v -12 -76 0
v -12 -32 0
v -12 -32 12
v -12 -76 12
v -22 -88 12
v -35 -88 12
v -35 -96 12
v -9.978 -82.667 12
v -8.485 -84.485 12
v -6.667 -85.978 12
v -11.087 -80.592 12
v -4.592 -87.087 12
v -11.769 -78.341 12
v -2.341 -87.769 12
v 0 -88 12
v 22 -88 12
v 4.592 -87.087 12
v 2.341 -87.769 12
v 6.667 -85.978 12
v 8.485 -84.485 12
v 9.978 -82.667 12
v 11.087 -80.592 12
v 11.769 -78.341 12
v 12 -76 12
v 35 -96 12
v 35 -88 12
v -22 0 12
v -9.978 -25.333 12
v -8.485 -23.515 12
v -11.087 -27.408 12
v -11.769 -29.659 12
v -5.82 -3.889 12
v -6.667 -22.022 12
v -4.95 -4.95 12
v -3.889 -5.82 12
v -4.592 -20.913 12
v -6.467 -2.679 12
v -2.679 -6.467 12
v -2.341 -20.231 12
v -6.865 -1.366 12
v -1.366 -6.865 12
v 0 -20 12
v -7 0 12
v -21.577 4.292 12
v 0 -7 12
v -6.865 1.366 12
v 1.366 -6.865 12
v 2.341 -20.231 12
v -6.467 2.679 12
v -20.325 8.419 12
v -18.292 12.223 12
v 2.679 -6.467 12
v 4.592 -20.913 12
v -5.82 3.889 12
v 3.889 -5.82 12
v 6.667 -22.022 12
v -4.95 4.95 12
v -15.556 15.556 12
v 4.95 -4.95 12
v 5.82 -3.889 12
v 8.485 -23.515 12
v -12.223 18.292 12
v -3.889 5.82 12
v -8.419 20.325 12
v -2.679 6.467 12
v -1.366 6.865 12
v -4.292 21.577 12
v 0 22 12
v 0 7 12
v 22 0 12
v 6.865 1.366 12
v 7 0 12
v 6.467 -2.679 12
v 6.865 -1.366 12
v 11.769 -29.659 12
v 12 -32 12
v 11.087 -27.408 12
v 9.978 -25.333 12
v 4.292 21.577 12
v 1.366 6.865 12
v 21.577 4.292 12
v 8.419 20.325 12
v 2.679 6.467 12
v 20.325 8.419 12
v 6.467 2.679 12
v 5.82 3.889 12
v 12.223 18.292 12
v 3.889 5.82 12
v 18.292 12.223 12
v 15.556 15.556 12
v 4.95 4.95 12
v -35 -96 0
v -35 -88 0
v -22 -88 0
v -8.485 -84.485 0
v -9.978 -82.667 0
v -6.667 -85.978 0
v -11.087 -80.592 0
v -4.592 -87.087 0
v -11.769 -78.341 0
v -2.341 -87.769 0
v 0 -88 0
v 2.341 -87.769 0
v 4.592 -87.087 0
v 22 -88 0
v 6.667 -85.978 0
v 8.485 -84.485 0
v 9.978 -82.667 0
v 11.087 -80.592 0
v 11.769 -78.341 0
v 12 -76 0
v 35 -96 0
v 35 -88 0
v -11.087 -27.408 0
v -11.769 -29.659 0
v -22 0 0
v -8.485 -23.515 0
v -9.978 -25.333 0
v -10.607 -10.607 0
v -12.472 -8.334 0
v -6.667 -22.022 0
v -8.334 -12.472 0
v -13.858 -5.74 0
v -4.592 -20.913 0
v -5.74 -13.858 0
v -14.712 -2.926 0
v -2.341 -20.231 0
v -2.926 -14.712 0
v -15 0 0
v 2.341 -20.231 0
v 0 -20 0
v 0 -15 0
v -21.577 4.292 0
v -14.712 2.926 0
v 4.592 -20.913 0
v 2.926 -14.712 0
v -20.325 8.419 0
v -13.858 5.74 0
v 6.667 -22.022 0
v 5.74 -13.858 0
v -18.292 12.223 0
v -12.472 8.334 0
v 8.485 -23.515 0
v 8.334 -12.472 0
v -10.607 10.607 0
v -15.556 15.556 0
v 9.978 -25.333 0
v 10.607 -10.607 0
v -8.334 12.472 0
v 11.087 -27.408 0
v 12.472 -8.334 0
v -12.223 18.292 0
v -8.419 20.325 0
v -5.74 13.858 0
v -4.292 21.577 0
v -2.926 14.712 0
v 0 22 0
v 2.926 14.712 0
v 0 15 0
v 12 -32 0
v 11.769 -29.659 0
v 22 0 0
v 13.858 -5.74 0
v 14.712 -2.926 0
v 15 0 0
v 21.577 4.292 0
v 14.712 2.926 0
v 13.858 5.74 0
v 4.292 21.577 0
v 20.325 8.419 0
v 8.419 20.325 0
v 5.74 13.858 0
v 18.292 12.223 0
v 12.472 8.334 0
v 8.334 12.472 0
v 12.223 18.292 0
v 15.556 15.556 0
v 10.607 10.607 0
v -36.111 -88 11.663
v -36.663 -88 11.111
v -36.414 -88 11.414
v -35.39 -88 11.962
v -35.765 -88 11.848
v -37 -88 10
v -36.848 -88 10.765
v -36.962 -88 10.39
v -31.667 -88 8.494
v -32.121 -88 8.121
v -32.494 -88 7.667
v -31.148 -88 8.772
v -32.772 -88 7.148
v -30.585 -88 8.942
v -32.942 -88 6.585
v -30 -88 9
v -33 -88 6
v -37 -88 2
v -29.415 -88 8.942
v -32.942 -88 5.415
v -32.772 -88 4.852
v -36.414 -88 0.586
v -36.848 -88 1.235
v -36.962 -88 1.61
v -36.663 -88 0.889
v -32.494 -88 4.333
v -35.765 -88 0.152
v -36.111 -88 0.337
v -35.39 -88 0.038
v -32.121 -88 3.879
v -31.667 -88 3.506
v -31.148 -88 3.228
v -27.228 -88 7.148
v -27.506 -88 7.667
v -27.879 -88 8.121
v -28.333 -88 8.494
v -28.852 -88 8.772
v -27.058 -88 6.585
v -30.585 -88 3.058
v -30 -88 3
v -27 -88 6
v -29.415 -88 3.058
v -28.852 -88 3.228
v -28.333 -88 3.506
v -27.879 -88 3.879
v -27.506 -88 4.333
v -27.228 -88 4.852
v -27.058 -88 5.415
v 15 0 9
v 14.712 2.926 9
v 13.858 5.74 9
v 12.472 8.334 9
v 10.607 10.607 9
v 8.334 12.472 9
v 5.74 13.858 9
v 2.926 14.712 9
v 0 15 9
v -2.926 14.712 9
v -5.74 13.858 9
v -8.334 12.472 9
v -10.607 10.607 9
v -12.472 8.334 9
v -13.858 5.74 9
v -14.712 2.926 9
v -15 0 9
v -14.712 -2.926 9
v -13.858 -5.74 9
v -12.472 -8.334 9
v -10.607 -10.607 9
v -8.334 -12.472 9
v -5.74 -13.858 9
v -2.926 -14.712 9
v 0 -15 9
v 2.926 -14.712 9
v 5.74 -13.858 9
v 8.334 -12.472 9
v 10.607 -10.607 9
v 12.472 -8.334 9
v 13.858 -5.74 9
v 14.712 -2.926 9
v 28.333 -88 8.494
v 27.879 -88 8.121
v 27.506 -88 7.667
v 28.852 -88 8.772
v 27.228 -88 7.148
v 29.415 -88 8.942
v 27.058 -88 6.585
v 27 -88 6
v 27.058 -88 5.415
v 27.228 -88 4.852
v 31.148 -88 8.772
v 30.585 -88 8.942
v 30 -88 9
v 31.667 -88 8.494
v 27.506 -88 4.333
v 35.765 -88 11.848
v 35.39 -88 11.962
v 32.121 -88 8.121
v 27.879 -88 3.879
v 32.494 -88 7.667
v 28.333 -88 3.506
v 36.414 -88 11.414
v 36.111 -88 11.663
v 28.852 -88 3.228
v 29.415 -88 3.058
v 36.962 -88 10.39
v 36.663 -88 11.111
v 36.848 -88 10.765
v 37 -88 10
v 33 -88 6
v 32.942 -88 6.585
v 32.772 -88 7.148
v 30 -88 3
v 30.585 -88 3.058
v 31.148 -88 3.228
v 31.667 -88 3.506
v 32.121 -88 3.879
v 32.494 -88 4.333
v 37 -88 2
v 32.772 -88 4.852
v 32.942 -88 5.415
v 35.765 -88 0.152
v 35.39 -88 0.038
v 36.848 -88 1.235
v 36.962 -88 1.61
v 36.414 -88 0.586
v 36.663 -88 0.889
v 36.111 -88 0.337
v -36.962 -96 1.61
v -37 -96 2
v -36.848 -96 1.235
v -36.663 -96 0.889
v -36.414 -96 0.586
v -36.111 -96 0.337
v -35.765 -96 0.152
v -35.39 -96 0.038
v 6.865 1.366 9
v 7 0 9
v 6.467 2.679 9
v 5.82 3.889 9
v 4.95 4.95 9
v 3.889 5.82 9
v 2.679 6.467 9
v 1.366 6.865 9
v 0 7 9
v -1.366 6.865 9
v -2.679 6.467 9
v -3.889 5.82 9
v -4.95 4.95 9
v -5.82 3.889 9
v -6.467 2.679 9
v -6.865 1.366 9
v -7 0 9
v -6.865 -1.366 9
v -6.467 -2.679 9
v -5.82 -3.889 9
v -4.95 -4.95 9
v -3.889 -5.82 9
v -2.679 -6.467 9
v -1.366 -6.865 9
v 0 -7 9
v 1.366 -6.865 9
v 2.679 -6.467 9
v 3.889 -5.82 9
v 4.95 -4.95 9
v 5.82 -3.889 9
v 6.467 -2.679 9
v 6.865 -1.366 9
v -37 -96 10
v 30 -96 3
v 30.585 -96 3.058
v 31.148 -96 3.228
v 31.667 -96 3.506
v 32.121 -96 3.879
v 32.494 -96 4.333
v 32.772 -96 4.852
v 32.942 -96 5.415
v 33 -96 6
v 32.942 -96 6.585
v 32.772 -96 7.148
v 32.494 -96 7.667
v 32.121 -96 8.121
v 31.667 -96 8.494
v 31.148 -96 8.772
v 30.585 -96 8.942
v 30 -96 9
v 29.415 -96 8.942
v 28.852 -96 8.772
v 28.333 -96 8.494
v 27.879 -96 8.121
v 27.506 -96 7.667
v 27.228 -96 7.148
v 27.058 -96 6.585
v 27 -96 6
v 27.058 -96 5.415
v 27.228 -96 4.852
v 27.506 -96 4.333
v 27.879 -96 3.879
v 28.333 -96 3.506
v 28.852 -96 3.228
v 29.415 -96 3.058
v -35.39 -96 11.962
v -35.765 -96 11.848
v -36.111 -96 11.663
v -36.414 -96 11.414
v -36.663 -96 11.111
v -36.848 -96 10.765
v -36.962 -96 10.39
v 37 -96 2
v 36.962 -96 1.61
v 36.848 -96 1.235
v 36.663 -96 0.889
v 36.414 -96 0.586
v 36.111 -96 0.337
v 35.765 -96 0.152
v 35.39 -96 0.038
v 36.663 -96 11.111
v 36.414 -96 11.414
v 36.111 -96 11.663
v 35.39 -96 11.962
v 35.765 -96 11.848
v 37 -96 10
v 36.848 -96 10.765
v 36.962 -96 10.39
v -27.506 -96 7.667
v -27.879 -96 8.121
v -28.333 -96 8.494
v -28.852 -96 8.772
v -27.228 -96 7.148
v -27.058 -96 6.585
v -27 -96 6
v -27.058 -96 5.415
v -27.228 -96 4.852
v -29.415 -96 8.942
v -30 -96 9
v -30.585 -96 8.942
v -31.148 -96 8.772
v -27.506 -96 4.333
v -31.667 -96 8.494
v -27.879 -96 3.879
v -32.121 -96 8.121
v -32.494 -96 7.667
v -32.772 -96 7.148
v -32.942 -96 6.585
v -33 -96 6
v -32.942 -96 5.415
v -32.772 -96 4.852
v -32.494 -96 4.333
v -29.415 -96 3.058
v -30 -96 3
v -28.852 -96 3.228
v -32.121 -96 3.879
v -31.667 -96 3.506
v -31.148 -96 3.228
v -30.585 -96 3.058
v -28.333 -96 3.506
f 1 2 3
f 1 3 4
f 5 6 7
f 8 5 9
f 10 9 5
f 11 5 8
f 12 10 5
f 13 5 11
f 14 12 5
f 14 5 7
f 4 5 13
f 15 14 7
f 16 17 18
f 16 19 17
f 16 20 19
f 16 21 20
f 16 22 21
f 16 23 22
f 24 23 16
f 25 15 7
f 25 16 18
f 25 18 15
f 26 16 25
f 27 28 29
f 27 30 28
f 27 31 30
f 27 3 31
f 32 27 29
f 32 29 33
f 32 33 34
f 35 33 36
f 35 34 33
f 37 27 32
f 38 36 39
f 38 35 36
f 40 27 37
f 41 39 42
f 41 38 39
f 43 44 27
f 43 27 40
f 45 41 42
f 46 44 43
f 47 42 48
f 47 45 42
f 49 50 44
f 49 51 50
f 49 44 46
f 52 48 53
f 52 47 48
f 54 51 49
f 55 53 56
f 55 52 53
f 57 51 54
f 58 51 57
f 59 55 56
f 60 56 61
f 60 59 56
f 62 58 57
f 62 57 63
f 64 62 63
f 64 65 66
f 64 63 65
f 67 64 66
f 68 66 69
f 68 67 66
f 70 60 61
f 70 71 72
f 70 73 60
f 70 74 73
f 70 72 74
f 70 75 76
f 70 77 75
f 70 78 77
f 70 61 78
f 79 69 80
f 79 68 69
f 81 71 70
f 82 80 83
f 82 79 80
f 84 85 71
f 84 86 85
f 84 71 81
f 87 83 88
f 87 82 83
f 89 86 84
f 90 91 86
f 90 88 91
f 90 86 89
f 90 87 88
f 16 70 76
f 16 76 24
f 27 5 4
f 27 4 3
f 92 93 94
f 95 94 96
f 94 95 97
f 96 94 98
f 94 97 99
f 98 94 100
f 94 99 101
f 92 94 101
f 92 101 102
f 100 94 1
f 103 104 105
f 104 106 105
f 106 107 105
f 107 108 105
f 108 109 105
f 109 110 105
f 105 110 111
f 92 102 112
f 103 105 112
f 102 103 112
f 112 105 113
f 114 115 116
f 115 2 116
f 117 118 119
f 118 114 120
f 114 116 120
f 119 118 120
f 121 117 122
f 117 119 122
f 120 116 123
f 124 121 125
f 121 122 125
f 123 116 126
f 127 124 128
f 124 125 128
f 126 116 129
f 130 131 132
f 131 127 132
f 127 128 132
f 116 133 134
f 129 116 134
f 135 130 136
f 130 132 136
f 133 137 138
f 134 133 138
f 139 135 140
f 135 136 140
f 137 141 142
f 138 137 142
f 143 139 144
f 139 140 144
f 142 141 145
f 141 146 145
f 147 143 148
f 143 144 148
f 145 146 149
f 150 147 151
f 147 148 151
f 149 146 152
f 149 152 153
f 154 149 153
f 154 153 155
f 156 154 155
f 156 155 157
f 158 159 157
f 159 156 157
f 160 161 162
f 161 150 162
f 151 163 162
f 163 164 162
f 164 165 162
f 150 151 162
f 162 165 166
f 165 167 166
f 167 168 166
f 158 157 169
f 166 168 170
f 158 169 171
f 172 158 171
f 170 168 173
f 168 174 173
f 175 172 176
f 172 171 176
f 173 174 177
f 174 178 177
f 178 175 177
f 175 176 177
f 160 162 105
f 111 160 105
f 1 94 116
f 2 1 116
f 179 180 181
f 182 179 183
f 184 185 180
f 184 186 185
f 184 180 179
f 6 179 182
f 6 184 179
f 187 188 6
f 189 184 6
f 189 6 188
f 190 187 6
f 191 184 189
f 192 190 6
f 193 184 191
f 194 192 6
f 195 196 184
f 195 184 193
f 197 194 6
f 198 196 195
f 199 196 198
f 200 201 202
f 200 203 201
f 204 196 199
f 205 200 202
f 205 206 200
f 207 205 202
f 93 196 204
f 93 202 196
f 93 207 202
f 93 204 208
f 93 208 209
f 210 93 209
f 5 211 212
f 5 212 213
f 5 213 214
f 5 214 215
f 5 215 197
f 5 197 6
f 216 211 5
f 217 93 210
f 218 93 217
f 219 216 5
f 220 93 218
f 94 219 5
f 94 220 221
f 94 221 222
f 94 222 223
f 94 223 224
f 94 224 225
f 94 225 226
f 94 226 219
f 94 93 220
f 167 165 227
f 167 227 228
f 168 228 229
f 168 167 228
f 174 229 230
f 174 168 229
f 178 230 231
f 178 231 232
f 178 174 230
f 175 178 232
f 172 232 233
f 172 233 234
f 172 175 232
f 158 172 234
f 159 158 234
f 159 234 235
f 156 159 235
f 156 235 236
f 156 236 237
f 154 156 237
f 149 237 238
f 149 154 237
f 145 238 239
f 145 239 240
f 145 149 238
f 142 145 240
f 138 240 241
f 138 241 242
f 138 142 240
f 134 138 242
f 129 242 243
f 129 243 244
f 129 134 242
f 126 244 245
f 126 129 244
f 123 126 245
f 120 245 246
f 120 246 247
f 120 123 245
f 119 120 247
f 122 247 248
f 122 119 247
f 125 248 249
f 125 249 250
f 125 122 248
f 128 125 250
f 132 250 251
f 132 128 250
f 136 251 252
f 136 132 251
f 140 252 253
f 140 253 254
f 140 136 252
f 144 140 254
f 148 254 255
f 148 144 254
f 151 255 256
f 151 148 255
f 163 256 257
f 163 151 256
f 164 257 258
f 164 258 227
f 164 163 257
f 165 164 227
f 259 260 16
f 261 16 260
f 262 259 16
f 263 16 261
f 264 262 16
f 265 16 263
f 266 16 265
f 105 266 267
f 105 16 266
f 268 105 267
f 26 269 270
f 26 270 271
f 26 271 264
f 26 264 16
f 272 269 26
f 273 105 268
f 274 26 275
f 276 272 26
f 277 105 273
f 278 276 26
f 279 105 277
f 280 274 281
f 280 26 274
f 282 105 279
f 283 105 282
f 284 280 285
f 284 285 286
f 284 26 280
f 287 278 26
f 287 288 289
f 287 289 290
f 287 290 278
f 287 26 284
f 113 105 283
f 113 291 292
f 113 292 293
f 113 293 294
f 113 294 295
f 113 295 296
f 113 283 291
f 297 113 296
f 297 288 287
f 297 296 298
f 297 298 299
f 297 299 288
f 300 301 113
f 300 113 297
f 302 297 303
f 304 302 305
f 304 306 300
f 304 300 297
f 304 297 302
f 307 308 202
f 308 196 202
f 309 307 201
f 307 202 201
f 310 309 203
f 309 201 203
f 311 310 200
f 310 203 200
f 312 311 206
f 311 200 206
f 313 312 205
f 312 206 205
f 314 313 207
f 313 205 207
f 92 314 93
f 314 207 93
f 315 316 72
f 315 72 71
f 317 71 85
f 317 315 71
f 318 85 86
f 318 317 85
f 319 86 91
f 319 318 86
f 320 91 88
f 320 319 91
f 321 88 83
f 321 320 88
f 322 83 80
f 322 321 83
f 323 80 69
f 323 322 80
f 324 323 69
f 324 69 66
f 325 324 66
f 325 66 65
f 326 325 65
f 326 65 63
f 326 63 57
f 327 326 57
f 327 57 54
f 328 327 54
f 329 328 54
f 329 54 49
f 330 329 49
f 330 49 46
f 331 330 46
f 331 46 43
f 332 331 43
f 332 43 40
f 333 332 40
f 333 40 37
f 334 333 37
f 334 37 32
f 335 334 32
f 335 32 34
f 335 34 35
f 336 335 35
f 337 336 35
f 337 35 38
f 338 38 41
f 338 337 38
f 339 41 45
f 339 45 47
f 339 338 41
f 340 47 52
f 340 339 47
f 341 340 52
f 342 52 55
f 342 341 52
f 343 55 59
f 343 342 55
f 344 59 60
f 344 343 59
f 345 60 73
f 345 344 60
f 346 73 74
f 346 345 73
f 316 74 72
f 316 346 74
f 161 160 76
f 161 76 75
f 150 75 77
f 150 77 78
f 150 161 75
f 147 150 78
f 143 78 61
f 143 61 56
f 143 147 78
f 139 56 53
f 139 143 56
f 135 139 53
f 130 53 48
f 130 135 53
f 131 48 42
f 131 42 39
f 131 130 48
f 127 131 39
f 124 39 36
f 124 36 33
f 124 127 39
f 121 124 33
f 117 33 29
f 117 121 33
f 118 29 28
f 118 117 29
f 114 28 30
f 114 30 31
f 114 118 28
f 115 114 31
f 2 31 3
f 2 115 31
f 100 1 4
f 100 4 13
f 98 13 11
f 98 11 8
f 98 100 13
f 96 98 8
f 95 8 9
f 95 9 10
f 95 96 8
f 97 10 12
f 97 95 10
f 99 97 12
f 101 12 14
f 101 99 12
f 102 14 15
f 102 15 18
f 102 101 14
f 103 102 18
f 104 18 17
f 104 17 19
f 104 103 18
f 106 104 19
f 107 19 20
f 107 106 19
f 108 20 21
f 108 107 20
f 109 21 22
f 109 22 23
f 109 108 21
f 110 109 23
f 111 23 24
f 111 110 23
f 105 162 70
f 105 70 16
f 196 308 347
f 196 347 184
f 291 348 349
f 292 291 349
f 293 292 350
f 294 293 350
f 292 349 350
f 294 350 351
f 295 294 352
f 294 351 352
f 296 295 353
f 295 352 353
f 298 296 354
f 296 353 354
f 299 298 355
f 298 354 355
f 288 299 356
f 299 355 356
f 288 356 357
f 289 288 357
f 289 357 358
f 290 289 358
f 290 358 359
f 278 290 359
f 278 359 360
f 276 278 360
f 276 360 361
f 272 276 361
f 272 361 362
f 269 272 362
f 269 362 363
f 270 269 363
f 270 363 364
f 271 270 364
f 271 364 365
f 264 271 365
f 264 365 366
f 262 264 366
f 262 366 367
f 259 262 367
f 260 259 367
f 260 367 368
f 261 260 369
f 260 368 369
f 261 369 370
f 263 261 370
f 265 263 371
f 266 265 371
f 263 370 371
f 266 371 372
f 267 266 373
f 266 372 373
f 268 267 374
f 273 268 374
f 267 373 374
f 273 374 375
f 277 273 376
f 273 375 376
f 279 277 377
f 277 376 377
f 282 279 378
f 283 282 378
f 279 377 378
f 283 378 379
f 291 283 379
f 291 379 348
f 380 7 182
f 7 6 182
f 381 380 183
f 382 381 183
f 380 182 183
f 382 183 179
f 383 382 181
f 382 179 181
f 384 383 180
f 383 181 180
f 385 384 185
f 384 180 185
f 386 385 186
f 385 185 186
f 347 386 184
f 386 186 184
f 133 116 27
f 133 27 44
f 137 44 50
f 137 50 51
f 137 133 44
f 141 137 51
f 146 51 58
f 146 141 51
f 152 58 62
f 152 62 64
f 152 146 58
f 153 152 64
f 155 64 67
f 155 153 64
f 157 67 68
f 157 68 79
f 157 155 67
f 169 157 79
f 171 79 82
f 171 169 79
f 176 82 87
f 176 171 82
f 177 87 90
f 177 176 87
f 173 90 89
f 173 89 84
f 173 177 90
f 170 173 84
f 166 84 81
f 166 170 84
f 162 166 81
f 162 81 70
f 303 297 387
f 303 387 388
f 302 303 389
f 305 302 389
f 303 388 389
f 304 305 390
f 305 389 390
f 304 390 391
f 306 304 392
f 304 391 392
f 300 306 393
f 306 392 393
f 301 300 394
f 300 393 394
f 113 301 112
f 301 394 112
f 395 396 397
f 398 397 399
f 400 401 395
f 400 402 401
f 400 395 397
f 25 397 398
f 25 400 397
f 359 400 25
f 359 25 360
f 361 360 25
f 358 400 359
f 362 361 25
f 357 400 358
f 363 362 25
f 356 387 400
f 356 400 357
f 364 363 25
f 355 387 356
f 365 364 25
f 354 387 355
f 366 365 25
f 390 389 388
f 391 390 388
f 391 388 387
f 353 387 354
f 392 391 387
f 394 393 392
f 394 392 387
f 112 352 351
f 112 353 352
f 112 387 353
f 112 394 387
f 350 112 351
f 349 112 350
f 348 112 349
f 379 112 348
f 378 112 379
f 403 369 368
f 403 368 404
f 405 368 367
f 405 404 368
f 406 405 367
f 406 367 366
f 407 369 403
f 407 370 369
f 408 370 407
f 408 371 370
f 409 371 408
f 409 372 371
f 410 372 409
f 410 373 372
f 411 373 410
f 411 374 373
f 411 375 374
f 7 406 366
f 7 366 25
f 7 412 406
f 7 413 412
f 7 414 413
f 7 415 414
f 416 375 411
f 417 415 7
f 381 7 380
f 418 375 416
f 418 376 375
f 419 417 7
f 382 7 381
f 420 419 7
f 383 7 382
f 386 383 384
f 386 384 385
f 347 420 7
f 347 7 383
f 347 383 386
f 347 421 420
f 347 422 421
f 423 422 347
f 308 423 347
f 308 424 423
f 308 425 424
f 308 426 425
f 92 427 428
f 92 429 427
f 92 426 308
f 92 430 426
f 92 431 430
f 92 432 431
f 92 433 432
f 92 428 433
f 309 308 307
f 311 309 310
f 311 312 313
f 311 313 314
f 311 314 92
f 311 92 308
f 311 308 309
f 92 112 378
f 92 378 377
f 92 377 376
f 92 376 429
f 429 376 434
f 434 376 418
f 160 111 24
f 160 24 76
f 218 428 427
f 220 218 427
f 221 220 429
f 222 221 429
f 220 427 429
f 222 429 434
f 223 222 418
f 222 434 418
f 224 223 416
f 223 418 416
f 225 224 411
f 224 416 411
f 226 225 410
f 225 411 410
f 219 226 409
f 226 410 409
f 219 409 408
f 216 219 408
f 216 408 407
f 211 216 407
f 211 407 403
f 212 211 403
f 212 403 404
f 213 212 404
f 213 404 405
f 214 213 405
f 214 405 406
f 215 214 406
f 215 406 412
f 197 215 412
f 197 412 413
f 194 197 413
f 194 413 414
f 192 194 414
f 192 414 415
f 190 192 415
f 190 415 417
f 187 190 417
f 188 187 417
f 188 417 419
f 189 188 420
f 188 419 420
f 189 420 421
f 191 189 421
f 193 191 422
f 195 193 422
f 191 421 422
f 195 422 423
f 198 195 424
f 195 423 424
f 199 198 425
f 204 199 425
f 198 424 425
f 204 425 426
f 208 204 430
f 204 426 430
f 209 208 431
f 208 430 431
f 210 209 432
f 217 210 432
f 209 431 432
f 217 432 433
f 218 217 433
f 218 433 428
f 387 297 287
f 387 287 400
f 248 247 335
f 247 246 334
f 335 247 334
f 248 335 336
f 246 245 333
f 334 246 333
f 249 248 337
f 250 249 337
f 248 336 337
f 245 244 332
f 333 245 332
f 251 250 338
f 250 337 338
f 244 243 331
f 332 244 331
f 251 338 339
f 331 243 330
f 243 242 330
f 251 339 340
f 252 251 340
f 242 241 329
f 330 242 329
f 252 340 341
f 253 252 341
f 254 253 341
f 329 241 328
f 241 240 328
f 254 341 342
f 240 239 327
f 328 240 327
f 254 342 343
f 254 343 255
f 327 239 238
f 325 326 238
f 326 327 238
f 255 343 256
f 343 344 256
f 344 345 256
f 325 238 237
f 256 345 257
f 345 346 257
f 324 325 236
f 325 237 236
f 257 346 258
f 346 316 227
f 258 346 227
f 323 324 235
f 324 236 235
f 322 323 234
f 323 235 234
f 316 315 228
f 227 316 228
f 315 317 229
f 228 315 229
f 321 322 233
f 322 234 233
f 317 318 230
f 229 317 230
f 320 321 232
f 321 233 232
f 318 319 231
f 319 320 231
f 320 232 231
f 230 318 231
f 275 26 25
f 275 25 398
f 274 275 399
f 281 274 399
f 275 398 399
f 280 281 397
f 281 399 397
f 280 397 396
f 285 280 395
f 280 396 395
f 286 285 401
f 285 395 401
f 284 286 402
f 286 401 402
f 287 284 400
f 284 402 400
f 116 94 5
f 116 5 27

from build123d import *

# Parameters (mm, degrees)
SKETCH1_R           = 7
BOSS_EXTRUDE2_DEPTH = 12
SKETCH3_R           = 3
CUT_EXTRUDE1_DEPTH  = 125.245724273
SKETCH1_4_R         = 15
SKETCH1_4_R_2       = 7
CUT_EXTRUDE2_DEPTH  = 9
FILLET1_R           = 2


with BuildPart() as part:
    # Sketch1 → Boss-Extrude2 (new body)
    with BuildSketch(Plane.XY):
        with BuildLine():
            Line((22, -88), (22, 0))
            ThreePointArc((22, 0), (0, 22), (-22, 0))
            Line((-22, 0), (-22, -88))
            Line((-22, -88), (-37, -88))
            Line((-37, -88), (-37, -96))
            Line((-37, -96), (37, -96))
            Line((37, -96), (37, -88))
            Line((37, -88), (22, -88))
        make_face()
        with BuildLine():
            ThreePointArc((-12, -32), (0, -20), (12, -32))
            Line((12, -32), (12, -76))
            ThreePointArc((12, -76), (0, -88), (-12, -76))
            Line((-12, -76), (-12, -32))
        make_face(mode=Mode.SUBTRACT)
        Circle(SKETCH1_R, mode=Mode.SUBTRACT)
    extrude(amount=BOSS_EXTRUDE2_DEPTH)

    # Sketch3 → Cut-Extrude1 (cut, through all)
    with BuildSketch(Plane.XZ.offset(96)):
        with Locations((-30, 6)):
            Circle(SKETCH3_R)
        with Locations((30, 6)):
            Circle(SKETCH3_R)
    extrude(amount=-CUT_EXTRUDE1_DEPTH, mode=Mode.SUBTRACT)

    # Sketch1<4> → Cut-Extrude2 (cut)
    with BuildSketch(Plane.XY):
        Circle(SKETCH1_4_R)
        Circle(SKETCH1_4_R_2, mode=Mode.SUBTRACT)
    extrude(amount=CUT_EXTRUDE2_DEPTH, mode=Mode.SUBTRACT)

    # Fillet1
    fillet1_edges = [part.edges().sort_by_distance(p)[0] for p in [
        (-37, -92, 0),
        (-37, -92, 12),
        (37, -92, 0),
        (37, -92, 12),
    ]]
    fillet(fillet1_edges, radius=FILLET1_R)


solid = part.part
